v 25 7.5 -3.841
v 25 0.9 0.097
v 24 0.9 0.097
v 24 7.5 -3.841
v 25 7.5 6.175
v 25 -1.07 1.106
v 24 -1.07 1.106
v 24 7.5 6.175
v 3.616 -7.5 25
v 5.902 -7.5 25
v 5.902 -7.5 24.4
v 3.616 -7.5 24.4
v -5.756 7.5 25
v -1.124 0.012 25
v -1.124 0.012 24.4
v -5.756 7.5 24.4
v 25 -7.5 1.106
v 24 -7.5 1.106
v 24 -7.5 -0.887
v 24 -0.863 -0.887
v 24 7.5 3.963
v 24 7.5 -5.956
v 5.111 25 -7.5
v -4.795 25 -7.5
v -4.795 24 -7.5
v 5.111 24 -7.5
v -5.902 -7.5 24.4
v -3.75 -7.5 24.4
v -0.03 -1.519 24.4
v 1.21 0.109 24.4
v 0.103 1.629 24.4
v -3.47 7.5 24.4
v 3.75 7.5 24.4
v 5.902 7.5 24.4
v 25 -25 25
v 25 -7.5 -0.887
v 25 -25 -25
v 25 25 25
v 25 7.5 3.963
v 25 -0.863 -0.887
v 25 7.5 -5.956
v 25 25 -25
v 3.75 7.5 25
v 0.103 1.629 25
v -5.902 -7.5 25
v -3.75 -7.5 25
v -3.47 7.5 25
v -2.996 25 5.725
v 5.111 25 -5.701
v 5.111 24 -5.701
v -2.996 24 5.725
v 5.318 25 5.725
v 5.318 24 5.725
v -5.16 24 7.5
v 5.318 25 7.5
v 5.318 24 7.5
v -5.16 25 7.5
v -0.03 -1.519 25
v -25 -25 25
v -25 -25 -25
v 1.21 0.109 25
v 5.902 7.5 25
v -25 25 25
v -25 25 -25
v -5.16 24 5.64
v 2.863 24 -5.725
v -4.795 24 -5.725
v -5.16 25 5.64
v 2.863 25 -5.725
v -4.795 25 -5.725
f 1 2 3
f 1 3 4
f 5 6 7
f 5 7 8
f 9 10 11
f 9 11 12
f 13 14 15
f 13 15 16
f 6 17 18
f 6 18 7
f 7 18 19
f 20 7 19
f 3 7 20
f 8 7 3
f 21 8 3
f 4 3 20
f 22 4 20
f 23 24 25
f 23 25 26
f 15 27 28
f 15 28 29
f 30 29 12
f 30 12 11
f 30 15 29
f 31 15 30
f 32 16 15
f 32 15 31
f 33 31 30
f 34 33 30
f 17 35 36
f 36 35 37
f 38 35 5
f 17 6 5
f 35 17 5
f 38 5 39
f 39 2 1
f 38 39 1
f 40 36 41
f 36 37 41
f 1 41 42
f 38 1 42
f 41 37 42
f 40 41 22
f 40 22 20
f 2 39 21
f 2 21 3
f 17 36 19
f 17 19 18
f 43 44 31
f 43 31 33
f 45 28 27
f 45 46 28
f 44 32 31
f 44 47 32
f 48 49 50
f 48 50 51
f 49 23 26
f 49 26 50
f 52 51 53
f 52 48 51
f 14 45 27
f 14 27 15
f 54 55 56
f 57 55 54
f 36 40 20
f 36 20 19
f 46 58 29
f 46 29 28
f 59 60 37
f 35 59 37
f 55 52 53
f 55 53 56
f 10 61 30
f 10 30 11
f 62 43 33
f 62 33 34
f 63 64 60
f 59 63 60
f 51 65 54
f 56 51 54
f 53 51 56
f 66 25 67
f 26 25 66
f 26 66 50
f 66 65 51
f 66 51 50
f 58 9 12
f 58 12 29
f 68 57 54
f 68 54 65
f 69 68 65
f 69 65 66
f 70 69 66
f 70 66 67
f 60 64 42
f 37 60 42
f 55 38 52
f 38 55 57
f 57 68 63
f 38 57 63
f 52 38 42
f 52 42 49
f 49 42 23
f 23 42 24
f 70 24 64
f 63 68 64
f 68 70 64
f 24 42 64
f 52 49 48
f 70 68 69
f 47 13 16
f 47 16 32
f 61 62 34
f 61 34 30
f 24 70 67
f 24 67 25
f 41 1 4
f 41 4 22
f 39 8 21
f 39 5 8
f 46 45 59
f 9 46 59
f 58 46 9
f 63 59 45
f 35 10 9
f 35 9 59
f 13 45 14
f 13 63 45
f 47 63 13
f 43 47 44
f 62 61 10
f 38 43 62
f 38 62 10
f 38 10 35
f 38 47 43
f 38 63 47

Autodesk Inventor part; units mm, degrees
sketch "Sketch1" plane through (0, 0, 0) normal (0, 0, 1) x (1, 0, 0)
  line L0 (-25, -25) -> (25, -25)
  line L1 (25, -25) -> (25, 25)
  line L2 (25, 25) -> (-25, 25)
  line L3 (-25, 25) -> (-25, -25)
  line L4 (-25, -25) -> (25, 25) construction
  line L5 (25, -25) -> (-25, 25) construction
  point P0 (0, 0)
  dimension "d15" = 50
  dimension "d18" = 50
extrude "Extrusion1" add sketch "Sketch1" along normal mid plane 50
sketch "Sketch2" plane through (0, 0, 25) normal (0, 0, 1) x (1, 0, 0)
  line L0 (-5.9866, 7.5) -> (5.9866, 7.5) construction
  line L1 (5.9866, 7.5) -> (5.9866, -7.5) construction
  line L2 (5.9866, -7.5) -> (-5.9866, -7.5) construction
  line L3 (-5.9866, -7.5) -> (-5.9866, 7.5) construction
  line L4 (-5.9866, 7.5) -> (5.9866, -7.5) construction
  line L5 (5.9015, -7.5) -> (3.6163, -7.5)
  line L6 (3.6163, -7.5) -> (-0.0304, -1.5194)
  line L7 (-0.0304, -1.5194) -> (-3.75, -7.5)
  line L8 (-3.75, -7.5) -> (-5.9015, -7.5)
  line L9 (-5.9015, -7.5) -> (-1.1244, 0.0122)
  line L10 (-1.1244, 0.0122) -> (-5.7557, 7.5)
  line L11 (-5.7557, 7.5) -> (-3.4704, 7.5)
  line L12 (-3.4704, 7.5) -> (0.1033, 1.6288)
  line L13 (0.1033, 1.6288) -> (3.75, 7.5)
  line L14 (3.75, 7.5) -> (5.9015, 7.5)
  line L15 (5.9015, 7.5) -> (1.2095, 0.1094)
  line L16 (1.2095, 0.1094) -> (5.9015, -7.5)
  point P0 (0, 0)
  point P1 (0, 0)
  point P2 (0, 0)
  point P3 (0, 0)
  dimension "d3" = 11.9733
  dimension "d4" = 15
extrude "Extrusion2" cut sketch "Sketch2" against normal blind 0.6
sketch "Sketch3" plane through (25, -25, 25) normal (1, 0, 0) x (0, 0, -1)
  line L0 (18.9344, 32.5) -> (31.0656, 32.5) construction
  line L1 (31.0656, 32.5) -> (31.0656, 17.5) construction
  line L2 (31.0656, 17.5) -> (18.9344, 17.5) construction
  line L3 (18.9344, 17.5) -> (18.9344, 32.5) construction
  line L4 (31.0656, 32.5) -> (18.9344, 17.5) construction
  line L5 (30.9562, 32.5) -> (25.8874, 24.137)
  line L6 (25.8874, 24.137) -> (25.8874, 17.5)
  line L7 (25.8874, 17.5) -> (23.8938, 17.5)
  line L8 (23.8938, 17.5) -> (23.8938, 23.9303)
  line L9 (23.8938, 23.9303) -> (18.825, 32.5)
  line L10 (18.825, 32.5) -> (21.0373, 32.5)
  line L11 (21.0373, 32.5) -> (24.9028, 25.8995)
  line L12 (24.9028, 25.8995) -> (28.8412, 32.5)
  line L13 (28.8412, 32.5) -> (30.9562, 32.5)
  point P0 (25, 25)
  point P1 (25, 25)
  dimension "d7" = 12.1313
  dimension "d8" = 15
extrude "Extrusion3" cut sketch "Sketch3" against normal blind 1
sketch "Sketch4" plane through (-25, 25, 25) normal (0, 1, 0) x (1, 0, 0)
  line L0 (19.2322, 32.5) -> (30.7678, 32.5) construction
  line L1 (30.7678, 32.5) -> (30.7678, 17.5) construction
  line L2 (30.7678, 17.5) -> (19.2322, 17.5) construction
  line L3 (19.2322, 17.5) -> (19.2322, 32.5) construction
  line L4 (30.7678, 32.5) -> (19.2322, 17.5) construction
  line L5 (30.3181, 17.5) -> (19.84, 17.5)
  line L6 (19.84, 17.5) -> (19.84, 19.3598)
  line L7 (19.84, 19.3598) -> (27.8626, 30.7253)
  line L8 (27.8626, 30.7253) -> (20.2046, 30.7253)
  line L9 (20.2046, 30.7253) -> (20.2046, 32.5)
  line L10 (20.2046, 32.5) -> (30.1114, 32.5)
  line L11 (30.1114, 32.5) -> (30.1114, 30.701)
  line L12 (30.1114, 30.701) -> (22.0036, 19.2747)
  line L13 (22.0036, 19.2747) -> (30.3181, 19.2747)
  line L14 (30.3181, 19.2747) -> (30.3181, 17.5)
  point P0 (25, 25)
  point P1 (25, 25)
  dimension "d11" = 11.5357
  dimension "d12" = 15
extrude "Extrusion4" cut sketch "Sketch4" against normal blind 1
equation "\"d18\" = d15"
equation "\"d1\" = d15"
properties part number "_3DPrint"
